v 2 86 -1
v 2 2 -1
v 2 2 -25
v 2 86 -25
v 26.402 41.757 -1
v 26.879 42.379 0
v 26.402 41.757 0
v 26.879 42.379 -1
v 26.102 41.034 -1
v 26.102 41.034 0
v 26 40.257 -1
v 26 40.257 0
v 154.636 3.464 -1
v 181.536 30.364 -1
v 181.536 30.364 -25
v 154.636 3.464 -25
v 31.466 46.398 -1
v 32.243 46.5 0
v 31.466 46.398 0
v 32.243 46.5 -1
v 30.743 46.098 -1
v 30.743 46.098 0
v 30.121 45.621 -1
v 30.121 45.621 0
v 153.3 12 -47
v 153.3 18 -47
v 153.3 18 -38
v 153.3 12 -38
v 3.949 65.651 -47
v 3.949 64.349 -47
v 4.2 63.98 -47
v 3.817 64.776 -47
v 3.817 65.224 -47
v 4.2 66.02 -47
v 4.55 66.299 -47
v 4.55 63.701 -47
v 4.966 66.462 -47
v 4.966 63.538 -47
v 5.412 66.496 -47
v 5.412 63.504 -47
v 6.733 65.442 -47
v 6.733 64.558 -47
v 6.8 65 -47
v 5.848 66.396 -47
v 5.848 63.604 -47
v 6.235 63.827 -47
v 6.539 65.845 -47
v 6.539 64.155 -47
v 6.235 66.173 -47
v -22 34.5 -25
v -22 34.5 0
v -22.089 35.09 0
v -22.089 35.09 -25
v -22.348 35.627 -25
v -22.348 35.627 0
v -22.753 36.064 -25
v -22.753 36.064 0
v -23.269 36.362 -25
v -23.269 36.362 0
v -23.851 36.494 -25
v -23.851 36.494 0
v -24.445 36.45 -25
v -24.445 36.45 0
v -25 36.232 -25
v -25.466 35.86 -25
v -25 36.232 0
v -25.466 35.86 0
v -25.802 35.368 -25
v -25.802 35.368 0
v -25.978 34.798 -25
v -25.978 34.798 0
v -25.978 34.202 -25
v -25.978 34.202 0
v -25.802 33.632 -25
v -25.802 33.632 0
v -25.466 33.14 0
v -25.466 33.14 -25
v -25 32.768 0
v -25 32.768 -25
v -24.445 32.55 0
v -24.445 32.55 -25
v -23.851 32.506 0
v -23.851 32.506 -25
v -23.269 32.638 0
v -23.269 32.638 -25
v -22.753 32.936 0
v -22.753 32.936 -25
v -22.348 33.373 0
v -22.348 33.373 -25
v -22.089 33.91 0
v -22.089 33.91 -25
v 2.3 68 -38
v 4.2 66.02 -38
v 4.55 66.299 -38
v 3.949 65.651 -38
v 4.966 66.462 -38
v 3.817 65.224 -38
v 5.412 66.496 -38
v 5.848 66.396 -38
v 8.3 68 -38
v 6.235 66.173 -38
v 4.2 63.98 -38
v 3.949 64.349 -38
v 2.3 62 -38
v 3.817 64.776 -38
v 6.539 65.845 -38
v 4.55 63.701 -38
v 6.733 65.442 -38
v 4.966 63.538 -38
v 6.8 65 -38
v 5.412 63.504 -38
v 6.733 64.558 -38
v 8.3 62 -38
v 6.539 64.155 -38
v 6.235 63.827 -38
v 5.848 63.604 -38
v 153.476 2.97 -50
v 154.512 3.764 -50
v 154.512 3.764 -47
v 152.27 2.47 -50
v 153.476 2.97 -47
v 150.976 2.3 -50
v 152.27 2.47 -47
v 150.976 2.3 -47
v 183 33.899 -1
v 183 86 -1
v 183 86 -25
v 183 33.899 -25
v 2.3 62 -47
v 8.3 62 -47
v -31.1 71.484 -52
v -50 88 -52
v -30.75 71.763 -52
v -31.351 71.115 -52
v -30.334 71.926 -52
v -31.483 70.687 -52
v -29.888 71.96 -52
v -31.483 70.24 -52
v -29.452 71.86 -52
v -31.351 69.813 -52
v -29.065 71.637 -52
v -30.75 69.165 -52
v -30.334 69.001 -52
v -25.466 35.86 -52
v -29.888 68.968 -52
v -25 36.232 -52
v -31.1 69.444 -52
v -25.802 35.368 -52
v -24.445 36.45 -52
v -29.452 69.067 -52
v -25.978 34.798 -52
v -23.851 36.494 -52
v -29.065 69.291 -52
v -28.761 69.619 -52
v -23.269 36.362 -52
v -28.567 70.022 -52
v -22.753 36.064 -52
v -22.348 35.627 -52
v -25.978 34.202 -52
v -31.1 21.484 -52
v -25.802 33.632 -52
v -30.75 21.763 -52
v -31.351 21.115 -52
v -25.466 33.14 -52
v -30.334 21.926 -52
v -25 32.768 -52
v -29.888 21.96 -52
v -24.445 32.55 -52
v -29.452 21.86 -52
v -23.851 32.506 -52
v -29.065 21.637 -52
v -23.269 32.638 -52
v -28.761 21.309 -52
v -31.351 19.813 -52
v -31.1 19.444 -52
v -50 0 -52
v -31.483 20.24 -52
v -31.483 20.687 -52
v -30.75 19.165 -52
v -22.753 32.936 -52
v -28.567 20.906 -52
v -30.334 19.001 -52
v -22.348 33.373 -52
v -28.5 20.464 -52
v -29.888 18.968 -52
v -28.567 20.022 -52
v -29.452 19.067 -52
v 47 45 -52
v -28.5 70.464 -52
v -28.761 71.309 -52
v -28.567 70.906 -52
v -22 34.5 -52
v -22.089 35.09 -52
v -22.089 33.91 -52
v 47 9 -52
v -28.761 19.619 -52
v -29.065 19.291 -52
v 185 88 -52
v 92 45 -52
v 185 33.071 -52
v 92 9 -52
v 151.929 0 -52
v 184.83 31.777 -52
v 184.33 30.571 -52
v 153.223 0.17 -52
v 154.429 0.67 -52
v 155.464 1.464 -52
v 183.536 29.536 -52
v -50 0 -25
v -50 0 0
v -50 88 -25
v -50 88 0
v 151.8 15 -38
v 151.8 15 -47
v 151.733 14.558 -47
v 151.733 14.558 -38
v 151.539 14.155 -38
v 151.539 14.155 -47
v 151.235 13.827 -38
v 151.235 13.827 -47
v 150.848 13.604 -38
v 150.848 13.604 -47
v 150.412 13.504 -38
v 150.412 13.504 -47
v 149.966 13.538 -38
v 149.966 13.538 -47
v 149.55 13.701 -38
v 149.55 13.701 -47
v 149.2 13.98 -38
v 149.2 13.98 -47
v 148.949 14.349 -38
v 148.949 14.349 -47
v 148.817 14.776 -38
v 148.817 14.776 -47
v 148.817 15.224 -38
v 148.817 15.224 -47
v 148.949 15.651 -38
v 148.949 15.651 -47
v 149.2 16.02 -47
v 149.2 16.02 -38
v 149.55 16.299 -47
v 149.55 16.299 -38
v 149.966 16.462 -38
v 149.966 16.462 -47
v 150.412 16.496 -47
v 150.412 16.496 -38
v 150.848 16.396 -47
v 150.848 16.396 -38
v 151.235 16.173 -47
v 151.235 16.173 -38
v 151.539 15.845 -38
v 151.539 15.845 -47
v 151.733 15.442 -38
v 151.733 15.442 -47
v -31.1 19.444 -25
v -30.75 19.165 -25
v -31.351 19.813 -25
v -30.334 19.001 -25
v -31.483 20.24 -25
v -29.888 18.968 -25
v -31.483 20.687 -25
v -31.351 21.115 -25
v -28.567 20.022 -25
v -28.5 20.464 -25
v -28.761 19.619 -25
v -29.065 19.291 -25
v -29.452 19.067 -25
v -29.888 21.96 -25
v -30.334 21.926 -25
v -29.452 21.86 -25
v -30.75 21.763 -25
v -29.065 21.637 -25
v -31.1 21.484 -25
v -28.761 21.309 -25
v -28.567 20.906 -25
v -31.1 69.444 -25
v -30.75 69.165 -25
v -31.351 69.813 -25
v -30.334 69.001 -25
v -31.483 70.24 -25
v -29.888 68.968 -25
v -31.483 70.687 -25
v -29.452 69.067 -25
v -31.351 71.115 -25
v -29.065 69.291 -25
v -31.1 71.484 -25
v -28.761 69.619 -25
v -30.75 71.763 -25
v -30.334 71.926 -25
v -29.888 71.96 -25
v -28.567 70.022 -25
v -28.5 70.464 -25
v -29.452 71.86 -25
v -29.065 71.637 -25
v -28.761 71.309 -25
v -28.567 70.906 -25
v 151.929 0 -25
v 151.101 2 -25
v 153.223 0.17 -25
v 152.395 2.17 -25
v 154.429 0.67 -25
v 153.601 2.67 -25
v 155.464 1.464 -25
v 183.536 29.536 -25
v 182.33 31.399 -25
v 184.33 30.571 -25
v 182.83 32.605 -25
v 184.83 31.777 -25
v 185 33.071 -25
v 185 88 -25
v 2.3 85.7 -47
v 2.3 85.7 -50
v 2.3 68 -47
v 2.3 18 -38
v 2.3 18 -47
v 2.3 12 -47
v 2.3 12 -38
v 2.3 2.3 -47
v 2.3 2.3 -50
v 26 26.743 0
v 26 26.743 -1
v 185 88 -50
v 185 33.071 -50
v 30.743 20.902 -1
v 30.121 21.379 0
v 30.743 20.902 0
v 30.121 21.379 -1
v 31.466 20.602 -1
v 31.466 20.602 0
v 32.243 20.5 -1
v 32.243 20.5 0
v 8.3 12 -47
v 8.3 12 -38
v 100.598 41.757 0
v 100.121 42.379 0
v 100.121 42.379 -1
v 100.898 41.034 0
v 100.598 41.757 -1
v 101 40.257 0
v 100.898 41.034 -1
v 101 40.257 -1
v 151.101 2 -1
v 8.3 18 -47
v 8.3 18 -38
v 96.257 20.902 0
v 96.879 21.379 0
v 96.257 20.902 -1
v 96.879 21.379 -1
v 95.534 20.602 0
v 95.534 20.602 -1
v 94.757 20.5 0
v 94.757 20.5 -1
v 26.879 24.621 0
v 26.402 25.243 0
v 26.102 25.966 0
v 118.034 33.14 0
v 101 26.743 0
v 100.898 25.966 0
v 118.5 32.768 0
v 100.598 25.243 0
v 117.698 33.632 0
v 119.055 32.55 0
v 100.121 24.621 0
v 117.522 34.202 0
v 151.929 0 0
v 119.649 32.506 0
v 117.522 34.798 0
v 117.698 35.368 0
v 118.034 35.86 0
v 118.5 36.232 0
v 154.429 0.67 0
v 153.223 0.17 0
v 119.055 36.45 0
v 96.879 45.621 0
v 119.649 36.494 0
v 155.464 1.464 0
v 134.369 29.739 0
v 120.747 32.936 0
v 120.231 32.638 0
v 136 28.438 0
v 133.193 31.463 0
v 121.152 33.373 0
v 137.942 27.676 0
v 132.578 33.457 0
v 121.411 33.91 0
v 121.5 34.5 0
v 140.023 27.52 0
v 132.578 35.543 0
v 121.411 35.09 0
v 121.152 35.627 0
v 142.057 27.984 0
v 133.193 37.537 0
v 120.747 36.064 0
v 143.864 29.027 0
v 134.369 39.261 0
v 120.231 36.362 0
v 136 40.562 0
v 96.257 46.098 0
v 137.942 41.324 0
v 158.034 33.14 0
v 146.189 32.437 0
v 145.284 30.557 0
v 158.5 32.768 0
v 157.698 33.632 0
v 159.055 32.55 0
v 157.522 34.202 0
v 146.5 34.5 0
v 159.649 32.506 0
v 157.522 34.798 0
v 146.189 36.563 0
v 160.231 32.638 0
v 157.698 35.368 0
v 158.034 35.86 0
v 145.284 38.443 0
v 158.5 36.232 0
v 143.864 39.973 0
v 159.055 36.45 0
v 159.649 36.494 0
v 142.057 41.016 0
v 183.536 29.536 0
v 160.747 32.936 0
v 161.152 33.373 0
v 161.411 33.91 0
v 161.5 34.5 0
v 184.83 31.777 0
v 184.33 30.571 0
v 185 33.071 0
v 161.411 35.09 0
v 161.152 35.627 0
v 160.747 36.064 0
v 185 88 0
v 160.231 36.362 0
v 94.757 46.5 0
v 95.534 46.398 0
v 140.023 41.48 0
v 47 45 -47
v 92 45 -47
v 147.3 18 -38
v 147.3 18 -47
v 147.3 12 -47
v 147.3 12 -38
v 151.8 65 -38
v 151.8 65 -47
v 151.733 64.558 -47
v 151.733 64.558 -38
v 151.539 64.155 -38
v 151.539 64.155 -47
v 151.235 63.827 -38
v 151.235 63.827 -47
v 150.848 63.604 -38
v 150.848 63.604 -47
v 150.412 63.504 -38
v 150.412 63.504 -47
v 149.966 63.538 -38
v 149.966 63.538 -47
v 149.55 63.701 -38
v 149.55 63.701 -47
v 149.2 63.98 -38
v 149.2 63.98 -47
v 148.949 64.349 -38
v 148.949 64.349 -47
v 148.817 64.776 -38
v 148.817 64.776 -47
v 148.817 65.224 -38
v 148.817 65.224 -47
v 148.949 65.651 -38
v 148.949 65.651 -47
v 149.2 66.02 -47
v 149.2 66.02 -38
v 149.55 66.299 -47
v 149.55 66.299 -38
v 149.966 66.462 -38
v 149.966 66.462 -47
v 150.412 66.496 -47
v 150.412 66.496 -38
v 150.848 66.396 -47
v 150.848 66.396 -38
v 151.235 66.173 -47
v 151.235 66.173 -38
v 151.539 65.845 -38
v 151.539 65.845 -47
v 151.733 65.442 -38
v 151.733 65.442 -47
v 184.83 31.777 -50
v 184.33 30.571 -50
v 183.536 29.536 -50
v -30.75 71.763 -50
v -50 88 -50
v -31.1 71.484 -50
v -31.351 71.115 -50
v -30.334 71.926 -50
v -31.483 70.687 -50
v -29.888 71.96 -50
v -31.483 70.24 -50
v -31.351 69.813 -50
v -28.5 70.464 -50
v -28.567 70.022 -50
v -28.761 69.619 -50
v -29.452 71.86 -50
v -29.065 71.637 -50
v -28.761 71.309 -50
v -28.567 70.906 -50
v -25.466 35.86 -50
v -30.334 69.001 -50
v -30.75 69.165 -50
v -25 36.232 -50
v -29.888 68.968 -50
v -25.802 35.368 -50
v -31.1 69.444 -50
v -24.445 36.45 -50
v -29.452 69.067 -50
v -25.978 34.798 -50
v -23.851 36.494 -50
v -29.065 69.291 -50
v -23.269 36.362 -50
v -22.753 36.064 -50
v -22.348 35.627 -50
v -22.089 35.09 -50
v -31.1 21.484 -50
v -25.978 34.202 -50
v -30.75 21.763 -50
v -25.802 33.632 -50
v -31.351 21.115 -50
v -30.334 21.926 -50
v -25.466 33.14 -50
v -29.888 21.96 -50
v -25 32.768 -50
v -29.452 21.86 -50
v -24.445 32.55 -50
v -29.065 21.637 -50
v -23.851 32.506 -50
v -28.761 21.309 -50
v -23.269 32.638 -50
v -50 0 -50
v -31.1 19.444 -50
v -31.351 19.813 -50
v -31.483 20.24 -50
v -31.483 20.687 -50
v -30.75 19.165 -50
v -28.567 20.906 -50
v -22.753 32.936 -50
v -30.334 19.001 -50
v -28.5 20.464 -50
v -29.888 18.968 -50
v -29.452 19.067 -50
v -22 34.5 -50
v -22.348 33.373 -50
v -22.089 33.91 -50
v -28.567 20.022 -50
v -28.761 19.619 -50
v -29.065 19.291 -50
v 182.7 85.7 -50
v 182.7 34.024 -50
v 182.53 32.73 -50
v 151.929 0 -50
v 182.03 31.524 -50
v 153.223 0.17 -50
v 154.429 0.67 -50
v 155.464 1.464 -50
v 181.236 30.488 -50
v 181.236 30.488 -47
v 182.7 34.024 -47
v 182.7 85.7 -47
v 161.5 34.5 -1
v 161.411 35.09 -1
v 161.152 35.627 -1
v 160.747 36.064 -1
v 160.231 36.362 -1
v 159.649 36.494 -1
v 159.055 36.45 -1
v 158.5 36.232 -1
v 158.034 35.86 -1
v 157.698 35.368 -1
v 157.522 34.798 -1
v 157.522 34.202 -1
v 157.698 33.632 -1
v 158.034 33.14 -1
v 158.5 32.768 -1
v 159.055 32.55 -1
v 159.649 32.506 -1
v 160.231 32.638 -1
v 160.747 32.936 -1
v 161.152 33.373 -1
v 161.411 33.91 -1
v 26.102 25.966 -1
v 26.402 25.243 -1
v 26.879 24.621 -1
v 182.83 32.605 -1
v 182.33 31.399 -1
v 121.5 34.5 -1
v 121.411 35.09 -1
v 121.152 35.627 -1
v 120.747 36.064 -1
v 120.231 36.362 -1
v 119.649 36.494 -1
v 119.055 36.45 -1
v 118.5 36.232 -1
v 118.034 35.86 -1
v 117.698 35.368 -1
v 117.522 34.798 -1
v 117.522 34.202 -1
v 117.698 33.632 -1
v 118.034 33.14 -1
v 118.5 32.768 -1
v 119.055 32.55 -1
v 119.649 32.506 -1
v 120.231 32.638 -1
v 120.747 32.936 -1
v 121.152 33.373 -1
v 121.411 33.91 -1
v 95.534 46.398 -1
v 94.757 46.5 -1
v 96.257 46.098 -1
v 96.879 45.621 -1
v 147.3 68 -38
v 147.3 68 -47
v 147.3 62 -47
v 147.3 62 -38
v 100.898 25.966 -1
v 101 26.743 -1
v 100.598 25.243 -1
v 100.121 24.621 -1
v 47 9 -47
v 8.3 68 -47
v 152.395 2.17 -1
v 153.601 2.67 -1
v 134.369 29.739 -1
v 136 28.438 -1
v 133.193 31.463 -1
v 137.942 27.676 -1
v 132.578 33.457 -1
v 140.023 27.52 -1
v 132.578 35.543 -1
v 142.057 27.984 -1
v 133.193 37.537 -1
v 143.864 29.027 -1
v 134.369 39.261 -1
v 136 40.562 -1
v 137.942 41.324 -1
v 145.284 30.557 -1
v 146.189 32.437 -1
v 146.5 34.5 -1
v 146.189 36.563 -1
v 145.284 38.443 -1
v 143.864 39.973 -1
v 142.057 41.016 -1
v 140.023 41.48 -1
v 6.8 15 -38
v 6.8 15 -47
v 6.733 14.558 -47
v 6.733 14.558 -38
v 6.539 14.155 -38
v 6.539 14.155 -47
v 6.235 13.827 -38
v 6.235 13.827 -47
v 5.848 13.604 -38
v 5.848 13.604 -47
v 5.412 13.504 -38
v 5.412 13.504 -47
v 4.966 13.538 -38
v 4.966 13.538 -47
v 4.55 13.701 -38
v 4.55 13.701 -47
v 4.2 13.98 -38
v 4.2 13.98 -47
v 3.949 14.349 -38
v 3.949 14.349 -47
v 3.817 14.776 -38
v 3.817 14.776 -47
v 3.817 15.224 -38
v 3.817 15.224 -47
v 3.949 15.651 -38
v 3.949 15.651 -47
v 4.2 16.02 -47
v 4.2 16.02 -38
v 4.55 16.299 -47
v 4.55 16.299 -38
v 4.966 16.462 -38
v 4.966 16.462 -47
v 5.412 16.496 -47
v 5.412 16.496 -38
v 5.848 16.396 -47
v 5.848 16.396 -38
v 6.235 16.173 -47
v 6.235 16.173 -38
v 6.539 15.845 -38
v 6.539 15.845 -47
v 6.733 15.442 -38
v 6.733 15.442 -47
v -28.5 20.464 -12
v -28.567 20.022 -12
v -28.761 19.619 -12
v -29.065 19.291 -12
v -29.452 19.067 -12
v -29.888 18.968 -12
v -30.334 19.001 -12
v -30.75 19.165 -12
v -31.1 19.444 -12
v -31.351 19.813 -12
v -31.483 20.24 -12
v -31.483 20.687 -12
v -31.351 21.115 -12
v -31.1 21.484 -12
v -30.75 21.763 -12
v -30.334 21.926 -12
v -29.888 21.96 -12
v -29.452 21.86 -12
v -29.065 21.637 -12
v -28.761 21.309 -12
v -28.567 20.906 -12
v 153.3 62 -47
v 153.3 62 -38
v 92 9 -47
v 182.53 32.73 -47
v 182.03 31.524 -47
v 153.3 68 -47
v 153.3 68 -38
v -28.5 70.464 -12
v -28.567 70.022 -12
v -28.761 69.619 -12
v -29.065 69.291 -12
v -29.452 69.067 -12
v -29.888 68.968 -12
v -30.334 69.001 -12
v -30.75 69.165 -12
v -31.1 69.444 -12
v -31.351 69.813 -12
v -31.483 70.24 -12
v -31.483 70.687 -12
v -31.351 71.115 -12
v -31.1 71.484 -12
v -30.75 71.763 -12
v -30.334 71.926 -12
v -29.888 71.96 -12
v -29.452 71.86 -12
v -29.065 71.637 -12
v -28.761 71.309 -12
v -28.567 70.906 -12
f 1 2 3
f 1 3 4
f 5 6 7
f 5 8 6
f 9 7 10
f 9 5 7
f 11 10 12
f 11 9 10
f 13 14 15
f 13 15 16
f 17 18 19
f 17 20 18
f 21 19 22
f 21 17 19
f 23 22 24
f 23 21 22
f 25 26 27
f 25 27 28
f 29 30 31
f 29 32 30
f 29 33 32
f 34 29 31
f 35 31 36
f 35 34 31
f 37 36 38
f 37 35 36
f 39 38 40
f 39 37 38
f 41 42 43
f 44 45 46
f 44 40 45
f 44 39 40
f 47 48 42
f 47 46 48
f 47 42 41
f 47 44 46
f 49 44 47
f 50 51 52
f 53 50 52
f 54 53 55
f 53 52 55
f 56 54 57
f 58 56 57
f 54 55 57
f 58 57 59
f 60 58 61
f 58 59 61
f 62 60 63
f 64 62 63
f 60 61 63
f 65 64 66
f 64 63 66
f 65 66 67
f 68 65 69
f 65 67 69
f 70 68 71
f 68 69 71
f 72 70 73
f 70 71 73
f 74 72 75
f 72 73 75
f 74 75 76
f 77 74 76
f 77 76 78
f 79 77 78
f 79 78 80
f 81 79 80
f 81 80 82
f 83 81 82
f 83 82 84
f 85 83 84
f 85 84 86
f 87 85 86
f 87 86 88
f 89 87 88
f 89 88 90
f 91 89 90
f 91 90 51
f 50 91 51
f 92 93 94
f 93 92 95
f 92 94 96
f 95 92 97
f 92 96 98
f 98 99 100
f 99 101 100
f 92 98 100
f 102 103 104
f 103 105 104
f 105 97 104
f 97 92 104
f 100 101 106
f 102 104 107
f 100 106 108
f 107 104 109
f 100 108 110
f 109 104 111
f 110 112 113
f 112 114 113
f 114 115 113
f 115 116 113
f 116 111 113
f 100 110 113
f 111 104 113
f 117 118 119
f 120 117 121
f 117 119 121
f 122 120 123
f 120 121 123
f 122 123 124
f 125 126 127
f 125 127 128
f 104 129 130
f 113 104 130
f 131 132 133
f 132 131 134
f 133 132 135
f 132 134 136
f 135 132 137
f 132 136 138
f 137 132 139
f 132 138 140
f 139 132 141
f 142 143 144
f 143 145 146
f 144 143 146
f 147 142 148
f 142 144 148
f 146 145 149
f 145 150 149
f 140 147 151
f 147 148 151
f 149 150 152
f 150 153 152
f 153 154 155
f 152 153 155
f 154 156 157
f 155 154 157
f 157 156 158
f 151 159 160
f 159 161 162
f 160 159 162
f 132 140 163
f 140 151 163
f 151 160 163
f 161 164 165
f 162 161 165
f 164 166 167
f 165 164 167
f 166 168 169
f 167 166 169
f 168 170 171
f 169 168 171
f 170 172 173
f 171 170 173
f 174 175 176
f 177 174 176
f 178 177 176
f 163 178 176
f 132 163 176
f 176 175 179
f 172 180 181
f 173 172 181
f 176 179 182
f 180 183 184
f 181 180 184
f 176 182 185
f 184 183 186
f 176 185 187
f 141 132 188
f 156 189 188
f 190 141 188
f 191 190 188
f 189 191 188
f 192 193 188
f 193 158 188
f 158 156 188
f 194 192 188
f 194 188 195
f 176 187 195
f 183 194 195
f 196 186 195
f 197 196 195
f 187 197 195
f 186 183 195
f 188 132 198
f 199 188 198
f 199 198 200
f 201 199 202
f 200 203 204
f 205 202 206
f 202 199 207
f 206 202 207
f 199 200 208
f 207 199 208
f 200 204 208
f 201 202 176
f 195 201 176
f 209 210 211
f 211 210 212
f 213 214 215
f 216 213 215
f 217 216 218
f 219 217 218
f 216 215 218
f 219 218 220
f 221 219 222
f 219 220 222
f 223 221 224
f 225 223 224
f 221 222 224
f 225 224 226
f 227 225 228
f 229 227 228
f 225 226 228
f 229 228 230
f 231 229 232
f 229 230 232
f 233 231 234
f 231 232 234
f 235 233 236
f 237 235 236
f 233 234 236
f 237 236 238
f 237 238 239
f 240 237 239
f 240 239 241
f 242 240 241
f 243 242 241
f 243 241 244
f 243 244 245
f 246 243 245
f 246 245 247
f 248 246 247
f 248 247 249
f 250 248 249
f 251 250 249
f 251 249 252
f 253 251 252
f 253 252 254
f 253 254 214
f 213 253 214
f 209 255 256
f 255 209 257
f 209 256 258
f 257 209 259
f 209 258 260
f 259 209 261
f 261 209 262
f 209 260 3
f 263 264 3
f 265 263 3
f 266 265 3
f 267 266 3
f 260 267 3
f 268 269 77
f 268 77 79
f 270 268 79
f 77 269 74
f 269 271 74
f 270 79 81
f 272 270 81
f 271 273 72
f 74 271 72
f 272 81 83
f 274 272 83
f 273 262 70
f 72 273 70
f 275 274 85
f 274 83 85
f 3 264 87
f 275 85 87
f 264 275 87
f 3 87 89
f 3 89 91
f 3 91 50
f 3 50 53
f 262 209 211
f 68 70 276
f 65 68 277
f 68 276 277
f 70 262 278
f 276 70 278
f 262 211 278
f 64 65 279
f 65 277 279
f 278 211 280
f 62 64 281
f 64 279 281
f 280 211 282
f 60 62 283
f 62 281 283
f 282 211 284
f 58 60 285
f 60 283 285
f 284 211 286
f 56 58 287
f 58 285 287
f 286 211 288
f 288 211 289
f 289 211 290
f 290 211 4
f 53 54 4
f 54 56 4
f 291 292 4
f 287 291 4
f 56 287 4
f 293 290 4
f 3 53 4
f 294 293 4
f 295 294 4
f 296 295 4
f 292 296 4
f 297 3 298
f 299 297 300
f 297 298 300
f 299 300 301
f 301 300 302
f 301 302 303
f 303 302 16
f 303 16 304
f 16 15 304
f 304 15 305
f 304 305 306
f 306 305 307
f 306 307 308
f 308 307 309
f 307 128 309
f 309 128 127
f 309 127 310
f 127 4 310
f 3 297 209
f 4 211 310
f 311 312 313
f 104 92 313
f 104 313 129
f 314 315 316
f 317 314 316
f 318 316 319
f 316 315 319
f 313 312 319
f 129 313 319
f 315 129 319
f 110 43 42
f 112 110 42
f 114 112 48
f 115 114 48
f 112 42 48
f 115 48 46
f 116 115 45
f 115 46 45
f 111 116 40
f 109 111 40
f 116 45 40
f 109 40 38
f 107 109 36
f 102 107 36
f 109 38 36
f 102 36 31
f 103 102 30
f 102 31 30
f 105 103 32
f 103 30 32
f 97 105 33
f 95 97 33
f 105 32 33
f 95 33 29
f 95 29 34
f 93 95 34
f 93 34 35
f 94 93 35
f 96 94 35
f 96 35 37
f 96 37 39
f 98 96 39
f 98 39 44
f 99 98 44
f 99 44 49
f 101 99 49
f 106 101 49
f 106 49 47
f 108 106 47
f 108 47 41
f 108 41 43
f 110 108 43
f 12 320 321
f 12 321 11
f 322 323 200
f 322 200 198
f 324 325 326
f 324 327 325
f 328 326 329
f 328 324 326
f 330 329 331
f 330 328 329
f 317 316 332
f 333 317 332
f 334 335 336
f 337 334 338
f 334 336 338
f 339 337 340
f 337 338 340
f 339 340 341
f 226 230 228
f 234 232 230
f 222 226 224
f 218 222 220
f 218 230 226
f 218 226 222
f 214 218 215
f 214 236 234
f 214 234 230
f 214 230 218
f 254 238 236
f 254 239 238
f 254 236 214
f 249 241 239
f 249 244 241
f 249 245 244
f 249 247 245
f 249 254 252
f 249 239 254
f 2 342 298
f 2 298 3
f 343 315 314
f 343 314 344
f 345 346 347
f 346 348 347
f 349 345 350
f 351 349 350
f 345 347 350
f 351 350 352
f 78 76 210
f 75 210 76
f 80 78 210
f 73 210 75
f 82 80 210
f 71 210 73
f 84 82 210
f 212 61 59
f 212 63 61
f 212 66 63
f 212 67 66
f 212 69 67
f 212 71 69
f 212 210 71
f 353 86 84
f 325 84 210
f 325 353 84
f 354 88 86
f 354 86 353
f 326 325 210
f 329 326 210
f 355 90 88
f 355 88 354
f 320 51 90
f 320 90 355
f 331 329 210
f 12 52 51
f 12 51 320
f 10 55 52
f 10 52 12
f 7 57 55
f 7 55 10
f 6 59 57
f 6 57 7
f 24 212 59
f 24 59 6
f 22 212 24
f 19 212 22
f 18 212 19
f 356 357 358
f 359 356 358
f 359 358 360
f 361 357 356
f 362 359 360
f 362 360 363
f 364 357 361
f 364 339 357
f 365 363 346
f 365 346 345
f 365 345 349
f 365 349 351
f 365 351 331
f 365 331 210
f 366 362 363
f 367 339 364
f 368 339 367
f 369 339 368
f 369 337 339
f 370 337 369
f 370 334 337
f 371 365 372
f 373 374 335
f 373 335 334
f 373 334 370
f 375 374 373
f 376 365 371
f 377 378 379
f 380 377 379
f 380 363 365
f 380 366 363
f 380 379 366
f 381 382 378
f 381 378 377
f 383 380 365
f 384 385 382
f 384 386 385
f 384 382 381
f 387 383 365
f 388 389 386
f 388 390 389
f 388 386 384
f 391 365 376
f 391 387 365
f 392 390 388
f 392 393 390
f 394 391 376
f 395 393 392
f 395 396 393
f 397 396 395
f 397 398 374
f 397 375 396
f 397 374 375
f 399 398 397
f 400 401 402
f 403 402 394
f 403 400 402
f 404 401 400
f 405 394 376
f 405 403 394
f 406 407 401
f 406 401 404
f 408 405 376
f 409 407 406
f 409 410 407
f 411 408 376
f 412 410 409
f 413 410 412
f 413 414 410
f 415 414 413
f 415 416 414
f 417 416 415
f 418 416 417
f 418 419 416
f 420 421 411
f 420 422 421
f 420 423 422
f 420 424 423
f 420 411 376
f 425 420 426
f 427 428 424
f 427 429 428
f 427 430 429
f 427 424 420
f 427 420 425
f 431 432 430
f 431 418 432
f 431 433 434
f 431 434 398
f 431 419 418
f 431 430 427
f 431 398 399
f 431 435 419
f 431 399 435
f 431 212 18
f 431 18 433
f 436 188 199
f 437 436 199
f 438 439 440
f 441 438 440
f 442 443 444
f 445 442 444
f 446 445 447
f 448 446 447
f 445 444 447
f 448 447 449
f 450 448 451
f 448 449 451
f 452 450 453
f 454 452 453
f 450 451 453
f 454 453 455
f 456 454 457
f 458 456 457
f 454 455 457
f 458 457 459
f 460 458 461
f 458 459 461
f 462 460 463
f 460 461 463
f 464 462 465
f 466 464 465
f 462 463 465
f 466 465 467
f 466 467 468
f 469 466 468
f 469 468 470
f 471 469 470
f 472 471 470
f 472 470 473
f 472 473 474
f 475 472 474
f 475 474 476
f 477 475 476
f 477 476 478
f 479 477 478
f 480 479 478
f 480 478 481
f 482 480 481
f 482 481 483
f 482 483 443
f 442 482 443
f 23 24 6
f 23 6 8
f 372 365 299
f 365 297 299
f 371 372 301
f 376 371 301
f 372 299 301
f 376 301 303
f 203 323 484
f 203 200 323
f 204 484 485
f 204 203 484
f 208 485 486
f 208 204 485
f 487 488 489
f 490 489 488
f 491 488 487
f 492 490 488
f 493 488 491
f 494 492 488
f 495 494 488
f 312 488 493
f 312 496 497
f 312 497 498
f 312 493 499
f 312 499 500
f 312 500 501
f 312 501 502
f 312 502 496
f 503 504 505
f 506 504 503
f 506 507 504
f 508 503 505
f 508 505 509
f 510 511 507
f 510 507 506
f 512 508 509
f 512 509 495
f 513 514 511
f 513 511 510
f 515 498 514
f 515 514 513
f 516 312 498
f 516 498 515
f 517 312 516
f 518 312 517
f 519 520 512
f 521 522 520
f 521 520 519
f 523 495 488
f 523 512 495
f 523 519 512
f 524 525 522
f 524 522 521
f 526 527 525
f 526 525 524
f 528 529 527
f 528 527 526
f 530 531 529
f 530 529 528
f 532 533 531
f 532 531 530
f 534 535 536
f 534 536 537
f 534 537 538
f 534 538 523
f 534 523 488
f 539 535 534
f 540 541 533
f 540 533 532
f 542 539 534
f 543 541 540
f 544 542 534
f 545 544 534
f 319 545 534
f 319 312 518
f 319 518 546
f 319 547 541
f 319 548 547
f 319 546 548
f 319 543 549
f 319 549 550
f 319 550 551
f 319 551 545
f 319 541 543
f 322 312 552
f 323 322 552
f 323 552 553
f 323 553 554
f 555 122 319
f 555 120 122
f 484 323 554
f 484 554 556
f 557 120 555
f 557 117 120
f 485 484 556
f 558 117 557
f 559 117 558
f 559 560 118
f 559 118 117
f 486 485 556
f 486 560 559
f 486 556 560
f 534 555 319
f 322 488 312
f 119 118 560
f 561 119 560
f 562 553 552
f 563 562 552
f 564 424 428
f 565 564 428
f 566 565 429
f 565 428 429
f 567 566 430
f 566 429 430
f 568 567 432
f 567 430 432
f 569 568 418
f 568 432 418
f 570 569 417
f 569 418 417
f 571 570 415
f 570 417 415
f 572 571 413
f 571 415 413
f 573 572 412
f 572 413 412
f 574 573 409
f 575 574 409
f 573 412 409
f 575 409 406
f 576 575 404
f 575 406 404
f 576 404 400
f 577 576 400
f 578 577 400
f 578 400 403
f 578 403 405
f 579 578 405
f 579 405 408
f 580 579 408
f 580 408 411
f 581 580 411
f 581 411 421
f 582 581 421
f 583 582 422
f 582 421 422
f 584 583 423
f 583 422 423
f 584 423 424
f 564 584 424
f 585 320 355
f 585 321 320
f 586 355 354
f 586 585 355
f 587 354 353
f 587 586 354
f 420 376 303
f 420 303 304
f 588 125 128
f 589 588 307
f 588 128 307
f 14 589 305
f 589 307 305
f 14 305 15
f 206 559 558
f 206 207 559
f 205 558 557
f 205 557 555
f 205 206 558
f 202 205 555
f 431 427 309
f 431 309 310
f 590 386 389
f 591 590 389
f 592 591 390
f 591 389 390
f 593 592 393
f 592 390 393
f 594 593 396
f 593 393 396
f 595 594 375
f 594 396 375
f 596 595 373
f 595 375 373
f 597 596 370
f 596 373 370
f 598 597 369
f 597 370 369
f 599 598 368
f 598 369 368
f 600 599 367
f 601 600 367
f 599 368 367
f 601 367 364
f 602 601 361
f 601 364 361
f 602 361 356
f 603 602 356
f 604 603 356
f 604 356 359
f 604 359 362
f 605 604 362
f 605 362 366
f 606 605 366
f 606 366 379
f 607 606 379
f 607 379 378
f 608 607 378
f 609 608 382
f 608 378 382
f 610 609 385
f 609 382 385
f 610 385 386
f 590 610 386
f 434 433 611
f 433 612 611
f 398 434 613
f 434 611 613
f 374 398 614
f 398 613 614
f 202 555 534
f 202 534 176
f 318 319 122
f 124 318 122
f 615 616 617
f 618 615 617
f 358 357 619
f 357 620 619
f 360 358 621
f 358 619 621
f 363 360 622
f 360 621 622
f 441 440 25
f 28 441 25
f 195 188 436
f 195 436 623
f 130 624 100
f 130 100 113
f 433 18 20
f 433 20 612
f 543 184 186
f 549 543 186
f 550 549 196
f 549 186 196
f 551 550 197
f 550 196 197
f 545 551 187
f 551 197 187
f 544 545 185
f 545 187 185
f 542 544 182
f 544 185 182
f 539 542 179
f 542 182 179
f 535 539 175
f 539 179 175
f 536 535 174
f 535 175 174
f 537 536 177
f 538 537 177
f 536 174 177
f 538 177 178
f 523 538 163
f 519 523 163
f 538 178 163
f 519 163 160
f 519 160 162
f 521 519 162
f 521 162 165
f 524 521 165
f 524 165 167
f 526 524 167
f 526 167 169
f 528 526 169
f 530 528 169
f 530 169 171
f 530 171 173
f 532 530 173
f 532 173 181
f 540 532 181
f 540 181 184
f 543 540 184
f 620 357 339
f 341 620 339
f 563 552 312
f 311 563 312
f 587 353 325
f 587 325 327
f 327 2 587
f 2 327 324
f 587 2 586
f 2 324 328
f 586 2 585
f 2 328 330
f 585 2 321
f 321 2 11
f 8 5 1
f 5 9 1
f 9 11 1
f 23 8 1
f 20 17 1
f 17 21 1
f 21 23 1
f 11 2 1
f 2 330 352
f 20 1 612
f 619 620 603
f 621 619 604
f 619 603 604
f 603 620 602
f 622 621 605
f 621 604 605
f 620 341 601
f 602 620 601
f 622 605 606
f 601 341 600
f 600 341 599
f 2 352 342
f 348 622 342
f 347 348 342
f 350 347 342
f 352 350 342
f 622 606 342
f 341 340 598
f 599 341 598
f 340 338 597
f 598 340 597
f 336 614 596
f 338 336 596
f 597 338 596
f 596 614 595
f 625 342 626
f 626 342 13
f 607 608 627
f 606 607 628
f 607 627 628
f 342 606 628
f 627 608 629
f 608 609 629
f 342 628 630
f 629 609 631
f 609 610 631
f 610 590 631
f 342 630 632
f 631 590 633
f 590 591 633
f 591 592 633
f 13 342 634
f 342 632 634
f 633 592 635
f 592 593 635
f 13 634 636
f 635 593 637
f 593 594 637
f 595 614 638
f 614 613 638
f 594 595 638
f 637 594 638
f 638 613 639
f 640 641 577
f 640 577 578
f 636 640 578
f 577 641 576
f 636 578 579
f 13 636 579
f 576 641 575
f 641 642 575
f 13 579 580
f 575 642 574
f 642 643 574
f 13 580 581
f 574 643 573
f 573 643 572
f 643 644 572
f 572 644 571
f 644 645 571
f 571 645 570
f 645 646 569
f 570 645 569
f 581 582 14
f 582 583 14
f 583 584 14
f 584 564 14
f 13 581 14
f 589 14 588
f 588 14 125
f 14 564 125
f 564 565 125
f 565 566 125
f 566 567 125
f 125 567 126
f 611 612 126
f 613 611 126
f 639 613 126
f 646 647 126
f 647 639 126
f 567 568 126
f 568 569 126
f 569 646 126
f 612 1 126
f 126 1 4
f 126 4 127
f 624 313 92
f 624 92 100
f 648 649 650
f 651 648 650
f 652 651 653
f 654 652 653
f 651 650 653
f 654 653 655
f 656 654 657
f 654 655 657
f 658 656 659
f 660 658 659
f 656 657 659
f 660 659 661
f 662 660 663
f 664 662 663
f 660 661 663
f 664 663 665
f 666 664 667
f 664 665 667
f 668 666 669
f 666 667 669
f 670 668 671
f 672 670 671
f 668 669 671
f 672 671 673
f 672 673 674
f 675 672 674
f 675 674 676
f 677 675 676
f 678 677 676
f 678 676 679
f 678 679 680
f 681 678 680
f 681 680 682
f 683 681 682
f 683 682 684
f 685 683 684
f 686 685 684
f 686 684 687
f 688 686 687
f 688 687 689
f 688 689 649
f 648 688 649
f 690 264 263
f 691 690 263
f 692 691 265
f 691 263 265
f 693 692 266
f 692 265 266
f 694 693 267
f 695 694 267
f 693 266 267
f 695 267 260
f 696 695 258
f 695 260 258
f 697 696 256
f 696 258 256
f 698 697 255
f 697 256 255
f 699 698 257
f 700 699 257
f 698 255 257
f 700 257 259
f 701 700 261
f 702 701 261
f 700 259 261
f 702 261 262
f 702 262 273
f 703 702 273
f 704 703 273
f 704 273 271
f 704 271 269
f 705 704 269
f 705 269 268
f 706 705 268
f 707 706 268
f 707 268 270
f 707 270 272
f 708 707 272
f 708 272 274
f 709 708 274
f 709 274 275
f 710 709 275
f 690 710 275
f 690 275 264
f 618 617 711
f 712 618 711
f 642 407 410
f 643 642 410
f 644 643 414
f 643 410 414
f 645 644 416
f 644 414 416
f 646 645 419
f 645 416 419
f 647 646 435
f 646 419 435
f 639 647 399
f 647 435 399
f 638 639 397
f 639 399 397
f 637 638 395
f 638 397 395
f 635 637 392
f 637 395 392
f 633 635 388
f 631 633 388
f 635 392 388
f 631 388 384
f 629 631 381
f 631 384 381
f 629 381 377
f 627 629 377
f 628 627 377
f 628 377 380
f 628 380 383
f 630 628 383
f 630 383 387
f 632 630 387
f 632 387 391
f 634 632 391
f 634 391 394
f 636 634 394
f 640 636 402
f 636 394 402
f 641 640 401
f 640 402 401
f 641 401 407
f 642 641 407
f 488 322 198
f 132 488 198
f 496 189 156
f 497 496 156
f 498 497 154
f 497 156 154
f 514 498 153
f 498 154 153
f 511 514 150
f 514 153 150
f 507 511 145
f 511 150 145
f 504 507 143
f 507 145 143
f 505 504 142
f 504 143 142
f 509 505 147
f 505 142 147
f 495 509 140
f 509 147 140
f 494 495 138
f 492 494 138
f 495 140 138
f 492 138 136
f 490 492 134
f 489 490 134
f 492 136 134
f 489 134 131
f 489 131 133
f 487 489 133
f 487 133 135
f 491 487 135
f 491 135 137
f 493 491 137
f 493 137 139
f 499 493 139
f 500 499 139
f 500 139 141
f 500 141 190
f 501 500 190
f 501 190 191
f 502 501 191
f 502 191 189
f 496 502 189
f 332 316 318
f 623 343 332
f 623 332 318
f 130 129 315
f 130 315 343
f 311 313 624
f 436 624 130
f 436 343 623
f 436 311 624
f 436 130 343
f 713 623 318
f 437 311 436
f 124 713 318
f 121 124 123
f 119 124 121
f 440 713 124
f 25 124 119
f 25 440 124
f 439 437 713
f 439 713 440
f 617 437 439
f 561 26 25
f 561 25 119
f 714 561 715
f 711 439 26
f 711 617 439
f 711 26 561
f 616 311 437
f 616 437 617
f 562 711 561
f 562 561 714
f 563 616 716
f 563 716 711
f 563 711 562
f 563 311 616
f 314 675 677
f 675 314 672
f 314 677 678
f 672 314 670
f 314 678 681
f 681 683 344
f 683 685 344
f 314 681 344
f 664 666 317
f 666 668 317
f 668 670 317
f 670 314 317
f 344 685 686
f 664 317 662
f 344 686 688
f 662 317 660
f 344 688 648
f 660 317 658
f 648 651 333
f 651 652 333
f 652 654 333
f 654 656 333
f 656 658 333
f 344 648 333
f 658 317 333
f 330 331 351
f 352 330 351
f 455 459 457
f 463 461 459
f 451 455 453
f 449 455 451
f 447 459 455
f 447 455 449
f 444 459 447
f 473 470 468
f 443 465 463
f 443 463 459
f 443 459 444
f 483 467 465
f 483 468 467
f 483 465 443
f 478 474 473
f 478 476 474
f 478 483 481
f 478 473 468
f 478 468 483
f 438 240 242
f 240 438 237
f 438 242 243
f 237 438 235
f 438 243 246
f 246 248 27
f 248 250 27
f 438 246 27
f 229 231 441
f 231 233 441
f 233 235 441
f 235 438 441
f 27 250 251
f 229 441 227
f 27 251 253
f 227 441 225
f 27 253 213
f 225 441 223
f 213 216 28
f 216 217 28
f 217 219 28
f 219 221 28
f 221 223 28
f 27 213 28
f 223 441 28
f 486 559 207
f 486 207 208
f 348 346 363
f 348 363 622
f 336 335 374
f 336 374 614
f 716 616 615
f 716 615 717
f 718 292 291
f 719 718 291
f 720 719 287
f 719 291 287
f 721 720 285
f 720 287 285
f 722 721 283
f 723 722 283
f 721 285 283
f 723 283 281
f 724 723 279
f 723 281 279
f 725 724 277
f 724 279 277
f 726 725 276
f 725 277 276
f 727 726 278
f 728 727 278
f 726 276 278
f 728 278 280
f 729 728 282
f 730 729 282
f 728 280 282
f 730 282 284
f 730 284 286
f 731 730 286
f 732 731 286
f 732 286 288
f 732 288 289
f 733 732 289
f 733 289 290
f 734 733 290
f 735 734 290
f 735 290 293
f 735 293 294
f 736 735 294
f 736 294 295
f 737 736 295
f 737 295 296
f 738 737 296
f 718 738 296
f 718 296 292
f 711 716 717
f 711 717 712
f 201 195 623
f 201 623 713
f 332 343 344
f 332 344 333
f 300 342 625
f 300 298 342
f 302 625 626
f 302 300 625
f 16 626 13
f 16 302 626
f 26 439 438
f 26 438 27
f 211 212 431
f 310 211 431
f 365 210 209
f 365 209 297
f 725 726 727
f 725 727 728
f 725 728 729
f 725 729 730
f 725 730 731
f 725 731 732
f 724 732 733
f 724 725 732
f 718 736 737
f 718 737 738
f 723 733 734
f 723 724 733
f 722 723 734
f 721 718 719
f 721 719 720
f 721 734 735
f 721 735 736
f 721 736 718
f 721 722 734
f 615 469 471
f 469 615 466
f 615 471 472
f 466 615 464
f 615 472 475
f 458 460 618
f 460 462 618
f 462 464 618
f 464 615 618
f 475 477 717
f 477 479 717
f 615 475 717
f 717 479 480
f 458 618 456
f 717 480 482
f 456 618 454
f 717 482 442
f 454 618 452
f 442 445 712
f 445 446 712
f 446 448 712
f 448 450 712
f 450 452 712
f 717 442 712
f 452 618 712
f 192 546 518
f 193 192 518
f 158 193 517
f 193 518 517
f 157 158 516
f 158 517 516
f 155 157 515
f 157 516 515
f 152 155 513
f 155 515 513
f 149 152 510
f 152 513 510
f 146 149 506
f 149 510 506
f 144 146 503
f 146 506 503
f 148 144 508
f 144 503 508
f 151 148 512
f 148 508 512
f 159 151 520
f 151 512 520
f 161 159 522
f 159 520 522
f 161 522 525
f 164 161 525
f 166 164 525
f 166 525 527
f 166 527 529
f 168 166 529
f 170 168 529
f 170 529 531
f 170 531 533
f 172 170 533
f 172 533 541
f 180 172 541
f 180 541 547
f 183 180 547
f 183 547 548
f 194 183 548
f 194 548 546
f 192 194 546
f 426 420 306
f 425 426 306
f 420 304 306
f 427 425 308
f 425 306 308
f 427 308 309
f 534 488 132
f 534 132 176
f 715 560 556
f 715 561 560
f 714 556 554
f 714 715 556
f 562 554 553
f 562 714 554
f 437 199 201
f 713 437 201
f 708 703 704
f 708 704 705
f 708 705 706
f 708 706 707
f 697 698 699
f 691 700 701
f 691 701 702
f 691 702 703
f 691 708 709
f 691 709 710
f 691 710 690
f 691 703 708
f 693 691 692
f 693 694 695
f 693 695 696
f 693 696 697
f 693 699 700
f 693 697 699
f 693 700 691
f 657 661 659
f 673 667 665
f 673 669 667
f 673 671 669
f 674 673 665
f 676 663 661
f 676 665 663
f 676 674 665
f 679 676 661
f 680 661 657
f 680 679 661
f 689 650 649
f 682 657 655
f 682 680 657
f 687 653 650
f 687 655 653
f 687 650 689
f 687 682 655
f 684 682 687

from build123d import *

# Parameters (mm, degrees)
F0_W      = 75
F0_H      = 26
F0_R      = 2
F0_R_2    = 7
F1_DEPTH  = 1
F2_DEPTH  = 25
F3_R      = 5
F4_SIZE   = 5
F5_R      = 3
F6_W      = 50
F6_H      = 88
F7_DEPTH  = 25
F10_DEPTH = 3
F11_DEPTH = 2
F12_DEPTH = 50
F13_R     = 5
F14_W     = 45
F14_H     = 11
F15_DEPTH = 25
F14_W_2   = 6
F14_H_2   = 6
F14_R     = 1.5
F16_DEPTH = 14
F17_R     = 1.5
F18_DEPTH = 40
F19_DEPTH = 25
F20_R     = 2
F21_DEPTH = 93.4


with BuildPart() as f1:
    # F0 (on Top) → F1 (new body)
    with BuildSketch(Plane.XY):
        Polygon((154, 68), (2, 68), (2, 2), (153.1715728753, 2), (154, 2.8284271247), align=None)
        with Locations((63.5, 33.5)):
            Rectangle(F0_W, F0_H, mode=Mode.SUBTRACT)
        with Locations((119.5, 34.5)):
            Circle(F0_R, mode=Mode.SUBTRACT)
        with Locations((139.5, 34.5)):
            Circle(F0_R_2, mode=Mode.SUBTRACT)
        Polygon((183, 68), (154, 68), (154, 2.8284271247), (183, 31.8284271247), align=None)
        with Locations((159.5, 34.5)):
            Circle(F0_R, mode=Mode.SUBTRACT)
        Polygon((2, 86), (2, 68), (154, 68), (183, 68), (183, 86), align=None)
    extrude(amount=-F1_DEPTH)

    # F0 (on Top) → F2 (join)
    with BuildSketch(Plane.XY):
        Polygon((0, 68), (0, 0), (154, 0), (185, 31), (185, 88), (0, 88), align=None)
        Polygon((2, 2), (2, 68), (2, 86), (183, 86), (183, 68), (183, 31.8284271247), (154, 2.8284271247), (153.1715728753, 2), align=None, mode=Mode.SUBTRACT)
    extrude(amount=-F2_DEPTH)

    # F3
    f3_edges = [f1.edges().sort_by_distance(p)[0] for p in [
        (154, 0, -12.5),
        (185, 31, -12.5),
        (153.171573, 2, -13),
        (183, 31.828427, -13),
    ]]
    fillet(f3_edges, radius=F3_R)

    # F4
    f4_edges = [f1.edges().sort_by_distance(p)[0] for p in [
        (26, 46.5, -0.5),
        (26, 20.5, -0.5),
        (101, 20.5, -0.5),
        (101, 46.5, -0.5),
    ]]
    chamfer(f4_edges, length=F4_SIZE)

    # F5
    f5_edges = [f1.edges().sort_by_distance(p)[0] for p in [
        (26, 41.5, -0.5),
        (31, 46.5, -0.5),
        (26, 25.5, -0.5),
        (31, 20.5, -0.5),
        (96, 46.5, -0.5),
        (101, 41.5, -0.5),
        (101, 25.5, -0.5),
        (96, 20.5, -0.5),
    ]]
    fillet(f5_edges, radius=F5_R)

    # F6 (on Top) → F7 (join)
    with BuildSketch(Plane.XY):
        with Locations((-25, 44)):
            Rectangle(F6_W, F6_H)
    extrude(amount=-F7_DEPTH)


with BuildPart() as f10:
    # F9 (on offset) → F10 (new body)
    with BuildSketch(Plane.XY.offset(-50)):
        Polygon((2.3, 85.7), (2.3, 2.3), (153.0473088065, 2.3), (182.7, 31.9526911935), (182.7, 85.7), align=None)
    extrude(amount=F10_DEPTH)

    # F9 (on offset) + F10_face (on face) → F11 (join)
    with BuildSketch(Plane.XY.offset(-50)):
        Polygon((0, 88), (0, 0), (154, 0), (185, 31), (185, 88), align=None)
        Polygon((153.0473088065, 2.3), (2.3, 2.3), (2.3, 85.7), (182.7, 85.7), (182.7, 31.9526911935), align=None, mode=Mode.SUBTRACT)
    with BuildSketch(Plane(origin=(90.0824463558, 44.9576740673, -50), x_dir=(1, 0, 0), z_dir=(0, 0, -1))):
        Polygon((92.6175536442, -40.7423259327), (92.6175536442, 13.0049828738), (62.9648624507, 42.6576740673), (-87.7824463558, 42.6576740673), (-87.7824463558, -40.7423259327), align=None)
    extrude(amount=-F11_DEPTH, dir=(0, 0, 1))

    # F12 (add): a face of the model
    f12_faces = [f10.faces().sort_by_distance(p)[0] for p in [
        (0, 44, -51),
    ]]
    extrude(f12_faces, amount=F12_DEPTH)

    # F13
    f13_edges = [f10.edges().sort_by_distance(p)[0] for p in [
        (153.047309, 2.3, -48.5),
        (154, 0, -51),
        (182.7, 31.952691, -48.5),
        (185, 31, -51),
    ]]
    fillet(f13_edges, radius=F13_R)

    # F14 (on face) → F15 (cut)
    with BuildSketch(Plane(origin=(0, 0, -52), x_dir=(1, 0, 0), z_dir=(0, 0, -1))):
        with Locations((69.5, -39.5)):
            Rectangle(F14_W, F14_H)
    extrude(amount=-F15_DEPTH, mode=Mode.SUBTRACT)

    # F14 (on face) → F16 (join)
    with BuildSketch(Plane(origin=(0, 0, -52), x_dir=(1, 0, 0), z_dir=(0, 0, -1))):
        with Locations((5.3, -65)):
            Rectangle(F14_W_2, F14_H_2)
        with Locations((5.3, -65)):
            Circle(F14_R, mode=Mode.SUBTRACT)
        with Locations((150.3, -65)):
            Rectangle(F14_W_2, F14_H_2)
        with Locations((150.3, -65)):
            Circle(F14_R, mode=Mode.SUBTRACT)
        with Locations((150.3, -15)):
            Rectangle(F14_W_2, F14_H_2)
        with Locations((150.3, -15)):
            Circle(F14_R, mode=Mode.SUBTRACT)
        with Locations((5.3, -15)):
            Rectangle(F14_W_2, F14_H_2)
        with Locations((5.3, -15)):
            Circle(F14_R, mode=Mode.SUBTRACT)
    extrude(amount=-F16_DEPTH)


with BuildPart() as f18_tool:
    # F17 (on face) → F18 (new body)
    with BuildSketch(Plane(origin=(0, 0, -52), x_dir=(1, 0, 0), z_dir=(0, 0, -1))):
        with Locations((-30, -20.4637907416)):
            Circle(F17_R)
        with Locations((-30, -70.4637907416)):
            Circle(F17_R)
    extrude(amount=-F18_DEPTH)


with BuildPart() as f1_1:
    add(f1.part)

    # F18: cut by f18_tool
    add(f18_tool.part, mode=Mode.SUBTRACT)


with BuildPart() as f10_1:
    add(f10.part)

    # F18: cut by f18_tool
    add(f18_tool.part, mode=Mode.SUBTRACT)

    # F19 (cut): a face of the model
    f19_faces = [f10_1.faces().sort_by_distance(p)[0] for p in [
        (69.5, 34, -49.5),
    ]]
    extrude(f19_faces, amount=-F19_DEPTH, mode=Mode.SUBTRACT)


with BuildPart() as f21_tool:
    # F20 (on face) → F21 (new body)
    with BuildSketch(Plane.XY):
        with Locations((-24, 34.5)):
            Circle(F20_R)
    extrude(amount=-F21_DEPTH)


with BuildPart() as f1_2:
    add(f1_1.part)

    # F21: cut by f21_tool
    add(f21_tool.part, mode=Mode.SUBTRACT)


with BuildPart() as f10_2:
    add(f10_1.part)

    # F21: cut by f21_tool
    add(f21_tool.part, mode=Mode.SUBTRACT)


solid = Compound([f1_2.part, f10_2.part])
